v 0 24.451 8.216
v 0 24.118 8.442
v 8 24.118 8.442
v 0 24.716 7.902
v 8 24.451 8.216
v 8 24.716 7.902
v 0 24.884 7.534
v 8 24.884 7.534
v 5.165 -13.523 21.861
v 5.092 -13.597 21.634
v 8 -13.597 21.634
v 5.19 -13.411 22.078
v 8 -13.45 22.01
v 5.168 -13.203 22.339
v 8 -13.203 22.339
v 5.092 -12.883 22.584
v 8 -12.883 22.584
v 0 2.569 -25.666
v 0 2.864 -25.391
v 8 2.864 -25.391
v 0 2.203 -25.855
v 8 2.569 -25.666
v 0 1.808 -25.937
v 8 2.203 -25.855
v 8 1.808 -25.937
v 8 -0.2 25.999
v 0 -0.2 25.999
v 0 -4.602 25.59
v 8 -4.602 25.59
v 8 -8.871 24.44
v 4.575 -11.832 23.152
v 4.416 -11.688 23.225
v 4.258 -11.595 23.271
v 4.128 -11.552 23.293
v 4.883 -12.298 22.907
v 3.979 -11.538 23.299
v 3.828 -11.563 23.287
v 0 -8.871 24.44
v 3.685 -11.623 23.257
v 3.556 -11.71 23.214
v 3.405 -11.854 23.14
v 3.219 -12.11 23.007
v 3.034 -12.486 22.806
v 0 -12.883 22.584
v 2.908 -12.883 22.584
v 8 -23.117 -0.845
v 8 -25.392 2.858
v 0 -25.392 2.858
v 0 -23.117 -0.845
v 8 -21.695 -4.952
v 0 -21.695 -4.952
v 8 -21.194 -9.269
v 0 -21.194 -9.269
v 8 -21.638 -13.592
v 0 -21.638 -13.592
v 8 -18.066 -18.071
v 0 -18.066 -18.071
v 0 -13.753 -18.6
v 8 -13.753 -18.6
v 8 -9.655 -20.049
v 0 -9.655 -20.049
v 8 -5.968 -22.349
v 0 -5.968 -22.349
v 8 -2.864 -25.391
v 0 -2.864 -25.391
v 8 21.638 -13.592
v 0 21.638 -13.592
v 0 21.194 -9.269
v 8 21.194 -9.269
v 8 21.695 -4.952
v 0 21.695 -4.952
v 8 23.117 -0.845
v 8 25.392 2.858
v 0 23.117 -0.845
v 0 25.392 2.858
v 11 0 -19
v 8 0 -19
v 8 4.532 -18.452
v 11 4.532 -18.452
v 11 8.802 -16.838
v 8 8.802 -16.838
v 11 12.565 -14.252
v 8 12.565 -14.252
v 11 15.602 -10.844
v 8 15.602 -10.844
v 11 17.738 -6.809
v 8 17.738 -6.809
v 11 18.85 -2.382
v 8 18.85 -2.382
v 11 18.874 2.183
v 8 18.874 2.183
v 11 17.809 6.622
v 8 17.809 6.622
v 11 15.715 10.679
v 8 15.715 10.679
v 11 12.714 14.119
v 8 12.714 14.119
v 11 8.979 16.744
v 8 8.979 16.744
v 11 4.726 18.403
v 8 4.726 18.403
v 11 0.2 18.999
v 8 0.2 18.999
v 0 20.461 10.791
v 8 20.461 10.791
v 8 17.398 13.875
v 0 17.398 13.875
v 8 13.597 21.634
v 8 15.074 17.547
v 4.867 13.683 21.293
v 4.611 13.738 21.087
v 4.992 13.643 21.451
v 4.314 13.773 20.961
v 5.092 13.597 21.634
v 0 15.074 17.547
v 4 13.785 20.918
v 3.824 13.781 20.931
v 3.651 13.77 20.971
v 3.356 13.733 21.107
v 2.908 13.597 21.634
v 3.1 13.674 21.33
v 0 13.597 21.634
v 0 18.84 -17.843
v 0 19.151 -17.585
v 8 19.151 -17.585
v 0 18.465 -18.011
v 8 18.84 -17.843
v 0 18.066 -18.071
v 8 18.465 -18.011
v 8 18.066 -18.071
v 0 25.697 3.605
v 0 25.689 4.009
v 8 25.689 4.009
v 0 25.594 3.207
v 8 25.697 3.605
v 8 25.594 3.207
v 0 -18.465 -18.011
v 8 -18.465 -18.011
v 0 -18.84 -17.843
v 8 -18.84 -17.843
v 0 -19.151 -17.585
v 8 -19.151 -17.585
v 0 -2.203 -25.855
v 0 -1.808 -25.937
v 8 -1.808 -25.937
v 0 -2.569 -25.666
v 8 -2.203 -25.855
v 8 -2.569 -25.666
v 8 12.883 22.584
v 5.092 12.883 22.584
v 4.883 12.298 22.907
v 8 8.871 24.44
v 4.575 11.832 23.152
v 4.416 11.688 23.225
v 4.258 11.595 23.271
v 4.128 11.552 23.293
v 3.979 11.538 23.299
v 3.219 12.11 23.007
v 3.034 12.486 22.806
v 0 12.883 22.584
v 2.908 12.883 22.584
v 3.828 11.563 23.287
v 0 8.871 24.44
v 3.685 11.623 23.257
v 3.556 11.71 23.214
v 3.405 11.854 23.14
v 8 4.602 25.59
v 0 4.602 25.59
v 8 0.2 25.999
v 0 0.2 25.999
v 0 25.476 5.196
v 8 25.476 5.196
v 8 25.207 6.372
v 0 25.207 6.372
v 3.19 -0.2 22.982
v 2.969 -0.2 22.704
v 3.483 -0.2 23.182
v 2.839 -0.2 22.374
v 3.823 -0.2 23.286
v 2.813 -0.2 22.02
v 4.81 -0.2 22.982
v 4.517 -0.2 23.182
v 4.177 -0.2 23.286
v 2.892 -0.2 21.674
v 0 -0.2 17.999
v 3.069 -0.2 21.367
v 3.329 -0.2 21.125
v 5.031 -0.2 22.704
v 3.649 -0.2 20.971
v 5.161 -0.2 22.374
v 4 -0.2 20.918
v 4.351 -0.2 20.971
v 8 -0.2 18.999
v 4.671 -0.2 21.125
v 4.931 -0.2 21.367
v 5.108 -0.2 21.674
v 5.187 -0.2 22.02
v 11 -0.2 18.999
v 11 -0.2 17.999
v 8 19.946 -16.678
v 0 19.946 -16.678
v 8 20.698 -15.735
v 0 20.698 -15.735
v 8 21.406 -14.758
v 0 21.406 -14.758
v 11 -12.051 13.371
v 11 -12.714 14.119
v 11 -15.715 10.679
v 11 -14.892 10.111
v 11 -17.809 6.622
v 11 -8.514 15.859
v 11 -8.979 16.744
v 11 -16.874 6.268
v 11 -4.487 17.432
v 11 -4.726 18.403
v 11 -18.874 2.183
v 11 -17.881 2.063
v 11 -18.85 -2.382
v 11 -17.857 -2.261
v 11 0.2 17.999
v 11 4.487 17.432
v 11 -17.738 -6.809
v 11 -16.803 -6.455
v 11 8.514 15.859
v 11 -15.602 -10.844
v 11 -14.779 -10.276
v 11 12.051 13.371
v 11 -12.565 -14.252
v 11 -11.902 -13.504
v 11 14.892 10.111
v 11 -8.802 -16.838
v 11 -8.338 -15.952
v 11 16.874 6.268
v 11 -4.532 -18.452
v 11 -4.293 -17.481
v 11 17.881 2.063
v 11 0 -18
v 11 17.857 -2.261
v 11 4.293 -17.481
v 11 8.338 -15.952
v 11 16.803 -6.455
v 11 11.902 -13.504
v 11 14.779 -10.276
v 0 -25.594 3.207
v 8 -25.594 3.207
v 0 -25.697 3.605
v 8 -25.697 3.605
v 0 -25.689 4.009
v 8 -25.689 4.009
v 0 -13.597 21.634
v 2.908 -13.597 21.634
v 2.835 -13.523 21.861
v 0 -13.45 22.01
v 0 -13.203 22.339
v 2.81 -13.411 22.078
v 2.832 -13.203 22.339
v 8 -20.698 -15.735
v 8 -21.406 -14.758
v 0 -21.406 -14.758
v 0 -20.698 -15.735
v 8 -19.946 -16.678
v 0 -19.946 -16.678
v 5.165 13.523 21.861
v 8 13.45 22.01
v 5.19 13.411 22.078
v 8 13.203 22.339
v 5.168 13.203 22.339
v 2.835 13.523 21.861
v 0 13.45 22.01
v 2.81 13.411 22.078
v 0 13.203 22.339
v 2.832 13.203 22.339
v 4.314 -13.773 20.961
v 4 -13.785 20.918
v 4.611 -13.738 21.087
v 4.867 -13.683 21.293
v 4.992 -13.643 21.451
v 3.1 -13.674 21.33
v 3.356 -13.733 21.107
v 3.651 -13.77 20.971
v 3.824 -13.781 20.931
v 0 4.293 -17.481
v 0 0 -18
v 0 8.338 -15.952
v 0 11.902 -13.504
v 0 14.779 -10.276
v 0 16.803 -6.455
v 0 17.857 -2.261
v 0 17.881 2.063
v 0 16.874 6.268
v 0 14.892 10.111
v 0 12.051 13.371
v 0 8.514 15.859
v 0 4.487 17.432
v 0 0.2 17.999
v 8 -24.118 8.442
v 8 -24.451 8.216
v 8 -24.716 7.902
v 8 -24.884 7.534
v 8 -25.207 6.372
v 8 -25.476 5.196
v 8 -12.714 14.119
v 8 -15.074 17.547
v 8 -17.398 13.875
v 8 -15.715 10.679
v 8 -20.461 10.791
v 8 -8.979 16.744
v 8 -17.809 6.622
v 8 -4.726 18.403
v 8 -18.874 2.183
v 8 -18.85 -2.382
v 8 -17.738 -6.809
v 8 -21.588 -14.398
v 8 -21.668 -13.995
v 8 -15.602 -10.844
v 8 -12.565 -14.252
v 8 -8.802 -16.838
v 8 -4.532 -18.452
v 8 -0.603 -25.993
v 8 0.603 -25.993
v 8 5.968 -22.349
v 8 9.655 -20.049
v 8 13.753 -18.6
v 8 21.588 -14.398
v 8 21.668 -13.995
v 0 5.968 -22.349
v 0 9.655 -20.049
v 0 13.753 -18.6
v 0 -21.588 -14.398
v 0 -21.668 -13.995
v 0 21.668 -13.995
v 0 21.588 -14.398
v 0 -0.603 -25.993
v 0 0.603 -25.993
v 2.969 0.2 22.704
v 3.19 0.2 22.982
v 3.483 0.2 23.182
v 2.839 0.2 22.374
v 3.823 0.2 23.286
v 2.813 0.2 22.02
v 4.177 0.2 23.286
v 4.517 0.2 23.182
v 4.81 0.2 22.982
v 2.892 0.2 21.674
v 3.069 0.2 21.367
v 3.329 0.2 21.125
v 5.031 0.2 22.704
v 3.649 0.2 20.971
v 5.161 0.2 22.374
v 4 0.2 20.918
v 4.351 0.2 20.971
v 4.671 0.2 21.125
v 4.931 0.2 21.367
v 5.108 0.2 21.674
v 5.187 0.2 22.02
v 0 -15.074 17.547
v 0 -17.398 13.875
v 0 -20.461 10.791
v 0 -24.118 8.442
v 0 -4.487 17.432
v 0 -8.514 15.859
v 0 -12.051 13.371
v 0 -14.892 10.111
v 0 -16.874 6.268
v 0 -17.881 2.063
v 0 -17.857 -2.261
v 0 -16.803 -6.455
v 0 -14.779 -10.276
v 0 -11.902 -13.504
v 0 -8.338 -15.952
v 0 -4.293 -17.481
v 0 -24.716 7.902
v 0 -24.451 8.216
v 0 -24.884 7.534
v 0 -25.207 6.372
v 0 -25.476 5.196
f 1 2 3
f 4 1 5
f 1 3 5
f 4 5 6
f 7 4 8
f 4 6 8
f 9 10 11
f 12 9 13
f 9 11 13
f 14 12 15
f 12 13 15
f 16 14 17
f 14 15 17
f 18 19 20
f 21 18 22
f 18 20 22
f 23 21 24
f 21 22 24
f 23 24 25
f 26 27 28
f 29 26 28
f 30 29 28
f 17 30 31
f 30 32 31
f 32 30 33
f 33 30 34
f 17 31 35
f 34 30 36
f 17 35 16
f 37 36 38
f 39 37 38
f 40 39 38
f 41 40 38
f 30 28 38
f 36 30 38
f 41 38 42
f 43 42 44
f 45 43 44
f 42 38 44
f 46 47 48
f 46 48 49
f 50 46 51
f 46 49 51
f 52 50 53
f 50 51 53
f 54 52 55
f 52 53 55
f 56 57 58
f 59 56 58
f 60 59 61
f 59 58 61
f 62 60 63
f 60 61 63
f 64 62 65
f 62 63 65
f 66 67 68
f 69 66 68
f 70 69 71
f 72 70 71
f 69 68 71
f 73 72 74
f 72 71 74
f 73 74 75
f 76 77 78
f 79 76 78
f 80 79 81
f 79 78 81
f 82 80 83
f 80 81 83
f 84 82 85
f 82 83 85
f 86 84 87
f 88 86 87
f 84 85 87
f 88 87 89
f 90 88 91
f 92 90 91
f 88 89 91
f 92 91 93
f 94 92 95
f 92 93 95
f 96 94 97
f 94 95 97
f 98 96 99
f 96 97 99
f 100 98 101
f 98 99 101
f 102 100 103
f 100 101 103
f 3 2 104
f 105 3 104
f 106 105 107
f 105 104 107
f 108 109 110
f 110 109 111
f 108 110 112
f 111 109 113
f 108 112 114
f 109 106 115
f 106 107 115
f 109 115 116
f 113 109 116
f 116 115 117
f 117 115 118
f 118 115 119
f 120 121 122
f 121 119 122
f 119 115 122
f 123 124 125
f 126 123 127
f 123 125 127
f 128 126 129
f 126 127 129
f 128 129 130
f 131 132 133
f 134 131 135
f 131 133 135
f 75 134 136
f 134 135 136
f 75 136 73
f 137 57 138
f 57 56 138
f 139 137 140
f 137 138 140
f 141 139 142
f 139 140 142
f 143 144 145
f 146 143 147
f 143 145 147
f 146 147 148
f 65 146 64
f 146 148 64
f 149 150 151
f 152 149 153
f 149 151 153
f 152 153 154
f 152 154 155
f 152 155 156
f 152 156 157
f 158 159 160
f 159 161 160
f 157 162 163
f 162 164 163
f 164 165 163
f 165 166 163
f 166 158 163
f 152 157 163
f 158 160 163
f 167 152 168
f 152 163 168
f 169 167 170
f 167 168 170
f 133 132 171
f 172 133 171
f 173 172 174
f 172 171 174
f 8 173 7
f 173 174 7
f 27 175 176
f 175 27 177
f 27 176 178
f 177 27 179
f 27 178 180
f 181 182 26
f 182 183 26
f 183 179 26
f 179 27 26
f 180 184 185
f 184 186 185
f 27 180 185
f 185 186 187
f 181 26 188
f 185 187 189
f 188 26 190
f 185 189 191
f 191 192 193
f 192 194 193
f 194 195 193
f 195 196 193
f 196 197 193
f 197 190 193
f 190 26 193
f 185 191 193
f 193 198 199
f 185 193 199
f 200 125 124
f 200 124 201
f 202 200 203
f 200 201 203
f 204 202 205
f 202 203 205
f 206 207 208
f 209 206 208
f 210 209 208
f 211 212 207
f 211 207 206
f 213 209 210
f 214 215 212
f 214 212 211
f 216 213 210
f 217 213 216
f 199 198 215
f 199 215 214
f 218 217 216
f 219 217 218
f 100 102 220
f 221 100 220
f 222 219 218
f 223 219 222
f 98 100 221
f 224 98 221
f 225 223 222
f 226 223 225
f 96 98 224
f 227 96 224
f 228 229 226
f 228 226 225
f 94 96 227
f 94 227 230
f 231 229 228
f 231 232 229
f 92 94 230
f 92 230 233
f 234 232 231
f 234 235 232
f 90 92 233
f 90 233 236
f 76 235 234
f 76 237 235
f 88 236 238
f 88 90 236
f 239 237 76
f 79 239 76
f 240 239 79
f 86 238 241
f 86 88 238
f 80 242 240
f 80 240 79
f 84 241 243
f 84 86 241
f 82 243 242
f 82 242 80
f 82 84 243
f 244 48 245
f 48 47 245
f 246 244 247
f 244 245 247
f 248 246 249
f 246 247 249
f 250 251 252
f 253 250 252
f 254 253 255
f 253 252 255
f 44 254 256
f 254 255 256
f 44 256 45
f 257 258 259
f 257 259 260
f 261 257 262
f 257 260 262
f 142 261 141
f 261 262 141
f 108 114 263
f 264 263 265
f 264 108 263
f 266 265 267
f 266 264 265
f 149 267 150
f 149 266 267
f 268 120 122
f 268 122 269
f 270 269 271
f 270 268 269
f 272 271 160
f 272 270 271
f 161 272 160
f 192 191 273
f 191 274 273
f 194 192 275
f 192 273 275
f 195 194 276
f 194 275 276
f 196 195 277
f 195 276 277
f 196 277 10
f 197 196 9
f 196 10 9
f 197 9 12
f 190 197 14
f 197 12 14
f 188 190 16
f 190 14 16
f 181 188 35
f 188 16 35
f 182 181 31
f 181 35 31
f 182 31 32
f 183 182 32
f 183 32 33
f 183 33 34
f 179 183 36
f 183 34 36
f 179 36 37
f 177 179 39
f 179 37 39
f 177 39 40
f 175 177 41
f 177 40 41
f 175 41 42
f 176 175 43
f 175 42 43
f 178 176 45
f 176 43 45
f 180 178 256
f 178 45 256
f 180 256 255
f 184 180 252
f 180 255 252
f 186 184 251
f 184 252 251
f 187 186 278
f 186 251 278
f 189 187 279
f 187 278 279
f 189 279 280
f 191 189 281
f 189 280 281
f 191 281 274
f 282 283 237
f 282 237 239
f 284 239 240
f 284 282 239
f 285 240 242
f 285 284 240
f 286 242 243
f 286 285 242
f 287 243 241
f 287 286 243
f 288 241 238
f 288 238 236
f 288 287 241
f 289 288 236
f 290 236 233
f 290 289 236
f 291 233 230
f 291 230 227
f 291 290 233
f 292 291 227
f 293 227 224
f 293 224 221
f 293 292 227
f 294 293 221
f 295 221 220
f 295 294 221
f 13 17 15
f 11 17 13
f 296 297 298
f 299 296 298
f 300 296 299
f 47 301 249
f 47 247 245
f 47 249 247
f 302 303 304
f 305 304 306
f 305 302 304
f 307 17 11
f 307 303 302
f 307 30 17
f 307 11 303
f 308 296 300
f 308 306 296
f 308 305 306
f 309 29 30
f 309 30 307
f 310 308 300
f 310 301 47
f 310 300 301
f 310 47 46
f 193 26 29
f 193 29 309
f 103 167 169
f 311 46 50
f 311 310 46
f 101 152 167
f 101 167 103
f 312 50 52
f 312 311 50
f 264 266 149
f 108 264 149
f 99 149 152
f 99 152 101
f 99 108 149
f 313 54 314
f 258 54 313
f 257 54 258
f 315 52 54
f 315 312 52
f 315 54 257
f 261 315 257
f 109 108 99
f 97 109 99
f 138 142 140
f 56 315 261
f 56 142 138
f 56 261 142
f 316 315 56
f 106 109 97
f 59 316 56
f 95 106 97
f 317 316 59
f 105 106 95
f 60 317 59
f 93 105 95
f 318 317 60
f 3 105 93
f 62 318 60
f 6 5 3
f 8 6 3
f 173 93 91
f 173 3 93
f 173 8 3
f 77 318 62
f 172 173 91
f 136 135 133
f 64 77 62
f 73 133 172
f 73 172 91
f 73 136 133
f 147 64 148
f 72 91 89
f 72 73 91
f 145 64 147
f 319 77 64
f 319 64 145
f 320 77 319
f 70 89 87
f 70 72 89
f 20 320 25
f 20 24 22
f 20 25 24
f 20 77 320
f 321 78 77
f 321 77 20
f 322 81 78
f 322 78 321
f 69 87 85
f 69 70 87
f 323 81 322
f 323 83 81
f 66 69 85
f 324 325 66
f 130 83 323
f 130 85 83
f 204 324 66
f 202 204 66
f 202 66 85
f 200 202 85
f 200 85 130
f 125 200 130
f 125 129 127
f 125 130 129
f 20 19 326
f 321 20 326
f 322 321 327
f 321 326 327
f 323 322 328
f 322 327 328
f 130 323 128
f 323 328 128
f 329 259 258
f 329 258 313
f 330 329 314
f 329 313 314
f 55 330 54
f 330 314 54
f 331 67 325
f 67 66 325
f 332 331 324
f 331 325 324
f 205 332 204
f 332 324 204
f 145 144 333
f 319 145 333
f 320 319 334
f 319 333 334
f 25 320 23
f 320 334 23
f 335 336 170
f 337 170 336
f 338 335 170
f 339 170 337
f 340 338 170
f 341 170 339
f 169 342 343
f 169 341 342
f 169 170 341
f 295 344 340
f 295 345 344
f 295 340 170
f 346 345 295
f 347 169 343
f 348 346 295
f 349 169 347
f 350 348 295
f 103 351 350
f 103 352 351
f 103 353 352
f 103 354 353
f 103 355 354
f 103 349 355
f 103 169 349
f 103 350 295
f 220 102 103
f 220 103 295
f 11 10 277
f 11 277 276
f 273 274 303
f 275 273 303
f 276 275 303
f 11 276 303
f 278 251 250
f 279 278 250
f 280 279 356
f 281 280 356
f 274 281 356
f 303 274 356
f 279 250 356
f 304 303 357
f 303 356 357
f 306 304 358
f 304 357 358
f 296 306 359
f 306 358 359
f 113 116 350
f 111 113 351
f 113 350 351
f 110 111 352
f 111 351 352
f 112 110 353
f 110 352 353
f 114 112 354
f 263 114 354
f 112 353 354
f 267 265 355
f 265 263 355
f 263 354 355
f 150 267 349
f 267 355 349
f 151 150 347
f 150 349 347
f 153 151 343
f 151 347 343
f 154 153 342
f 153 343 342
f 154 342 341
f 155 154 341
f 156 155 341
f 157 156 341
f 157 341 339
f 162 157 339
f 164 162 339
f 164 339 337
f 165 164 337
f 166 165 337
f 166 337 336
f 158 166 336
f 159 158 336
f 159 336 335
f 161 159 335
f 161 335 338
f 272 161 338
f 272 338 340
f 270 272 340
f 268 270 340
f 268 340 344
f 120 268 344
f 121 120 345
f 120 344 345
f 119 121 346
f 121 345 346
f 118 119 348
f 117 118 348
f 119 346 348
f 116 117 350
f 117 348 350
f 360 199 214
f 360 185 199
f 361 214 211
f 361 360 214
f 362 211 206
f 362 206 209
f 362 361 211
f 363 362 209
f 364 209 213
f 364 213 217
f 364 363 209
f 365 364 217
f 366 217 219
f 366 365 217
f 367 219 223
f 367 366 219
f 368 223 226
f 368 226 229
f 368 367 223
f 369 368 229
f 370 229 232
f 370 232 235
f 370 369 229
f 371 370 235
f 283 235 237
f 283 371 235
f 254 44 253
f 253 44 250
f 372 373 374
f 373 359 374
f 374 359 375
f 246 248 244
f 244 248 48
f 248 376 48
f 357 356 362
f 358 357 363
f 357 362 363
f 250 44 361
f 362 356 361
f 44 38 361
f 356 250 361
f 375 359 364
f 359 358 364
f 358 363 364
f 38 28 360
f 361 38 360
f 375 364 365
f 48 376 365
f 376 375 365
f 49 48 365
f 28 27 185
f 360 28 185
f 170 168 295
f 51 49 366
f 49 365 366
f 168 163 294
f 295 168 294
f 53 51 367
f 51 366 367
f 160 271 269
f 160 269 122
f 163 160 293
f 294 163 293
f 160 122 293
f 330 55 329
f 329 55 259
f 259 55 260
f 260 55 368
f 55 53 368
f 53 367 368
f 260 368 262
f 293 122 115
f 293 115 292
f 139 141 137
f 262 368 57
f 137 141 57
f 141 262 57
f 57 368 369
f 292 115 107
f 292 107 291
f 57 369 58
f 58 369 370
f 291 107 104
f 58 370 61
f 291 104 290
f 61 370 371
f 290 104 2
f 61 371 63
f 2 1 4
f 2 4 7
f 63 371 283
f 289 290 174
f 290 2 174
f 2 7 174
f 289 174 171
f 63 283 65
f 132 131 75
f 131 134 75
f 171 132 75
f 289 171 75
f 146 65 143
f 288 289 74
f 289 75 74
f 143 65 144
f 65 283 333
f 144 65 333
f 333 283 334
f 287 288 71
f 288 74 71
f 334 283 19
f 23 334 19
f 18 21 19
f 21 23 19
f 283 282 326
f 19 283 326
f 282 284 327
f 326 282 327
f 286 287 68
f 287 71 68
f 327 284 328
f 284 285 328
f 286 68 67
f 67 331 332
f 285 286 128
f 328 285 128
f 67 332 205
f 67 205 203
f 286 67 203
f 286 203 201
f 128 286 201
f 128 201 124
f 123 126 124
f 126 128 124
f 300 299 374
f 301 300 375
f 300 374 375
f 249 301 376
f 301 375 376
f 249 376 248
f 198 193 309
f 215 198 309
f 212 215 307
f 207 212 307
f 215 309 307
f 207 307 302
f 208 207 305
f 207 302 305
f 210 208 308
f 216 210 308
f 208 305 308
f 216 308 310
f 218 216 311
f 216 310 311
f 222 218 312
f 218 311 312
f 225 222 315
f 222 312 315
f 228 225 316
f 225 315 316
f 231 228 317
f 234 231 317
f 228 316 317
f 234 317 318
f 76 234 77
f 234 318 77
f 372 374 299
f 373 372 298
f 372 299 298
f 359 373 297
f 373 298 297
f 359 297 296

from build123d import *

# Parameters (mm, degrees)
CROQUIS1_R              = 18
SALIENTE_EXTRUIR1_DEPTH = 8
CROQUIS2_R              = 19
CROQUIS2_R_2            = 18
SALIENTE_EXTRUIR2_DEPTH = 3
CROQUIS3_W              = 33
CROQUIS3_H              = 0.4
CORTAR_EXTRUIR2_DEPTH   = 16.5
REDONDEO1_R             = 1.5
CROQUIS4_R              = 1.190625
CORTAR_EXTRUIR3_DEPTH   = 16.5


with BuildPart() as part:
    # Croquis1 → Saliente-Extruir1 (new body)
    with BuildSketch(Plane(origin=(0, 0, 0), x_dir=(0, 0, -1), z_dir=(1, 0, 0))):
        with BuildLine():
            ThreePointArc((-22.245034297, 13.459511474), (-26, 0), (-22.245034297, -13.459511474))
            ThreePointArc((-22.245034297, -13.459511474), (-13.874638854, -17.398246822), (-8.172067613, -24.682327908))
            ThreePointArc((-8.172067613, -24.682327908), (-5.785544283, -25.348125717), (-3.346482217, -25.783736284))
            ThreePointArc((-3.346482217, -25.783736284), (4.951801275, -21.695258927), (14.202220202, -21.778359473))
            ThreePointArc((14.202220202, -21.778359473), (16.210734848, -20.327618544), (18.072039228, -18.69228178))
            ThreePointArc((18.072039228, -18.69228178), (20.049434046, -9.655298558), (25.881946532, -2.474842158))
            ThreePointArc((25.881946532, -2.474842158), (26, 0), (25.881946532, 2.474842158))
            ThreePointArc((25.881946532, 2.474842158), (20.049434046, 9.655298558), (18.072039228, 18.69228178))
            ThreePointArc((18.072039228, 18.69228178), (16.210734848, 20.327618544), (14.202220202, 21.778359473))
            ThreePointArc((14.202220202, 21.778359473), (4.951801275, 21.695258927), (-3.346482217, 25.783736284))
            ThreePointArc((-3.346482217, 25.783736284), (-5.785544283, 25.348125717), (-8.172067613, 24.682327908))
            ThreePointArc((-8.172067613, 24.682327908), (-13.874638854, 17.398246822), (-22.245034297, 13.459511474))
        make_face()
        Circle(CROQUIS1_R, mode=Mode.SUBTRACT)
    extrude(amount=SALIENTE_EXTRUIR1_DEPTH)

    # Croquis2 → Saliente-Extruir2 (add)
    with BuildSketch(Plane(origin=(8, 0, 0), x_dir=(0, 0, -1), z_dir=(1, 0, 0))):
        Circle(CROQUIS2_R)
        Circle(CROQUIS2_R_2, mode=Mode.SUBTRACT)
    extrude(amount=SALIENTE_EXTRUIR2_DEPTH)

    # Croquis3 → Cortar-Extruir2 (cut, symmetric)
    with BuildSketch(Plane(origin=(0, 0, 0), x_dir=(0, 0, -1), z_dir=(1, 0, 0))):
        with Locations((-16.5, 0)):
            Rectangle(CROQUIS3_W, CROQUIS3_H)
    extrude(amount=CORTAR_EXTRUIR2_DEPTH, both=True, mode=Mode.SUBTRACT)

    # Redondeo1
    redondeo1_edges = [part.edges().sort_by_distance(p)[0] for p in [
        (4, 25.783736284, 3.346482217),
        (4, 21.778359473, -14.202220202),
        (4, 18.69228178, -18.072039228),
        (4, 2.474842158, -25.881946532),
        (4, -2.474842158, -25.881946532),
        (4, -18.69228178, -18.072039228),
        (4, -21.778359473, -14.202220202),
        (4, -25.783736284, 3.346482217),
        (4, -24.682327908, 8.172067613),
        (4, -13.459511474, 22.245034297),
        (4, 13.459511474, 22.245034297),
        (4, 24.682327908, 8.172067613),
    ]]
    fillet(redondeo1_edges, radius=REDONDEO1_R)

    # Croquis4 → Cortar-Extruir3 (cut, symmetric)
    with BuildSketch(Plane.XZ.offset(-0.2)):
        with Locations(Location((4, 22.109052571, 0), (0, 0, 270))):
            Circle(CROQUIS4_R)
    extrude(amount=CORTAR_EXTRUIR3_DEPTH, both=True, mode=Mode.SUBTRACT)


solid = part.part
